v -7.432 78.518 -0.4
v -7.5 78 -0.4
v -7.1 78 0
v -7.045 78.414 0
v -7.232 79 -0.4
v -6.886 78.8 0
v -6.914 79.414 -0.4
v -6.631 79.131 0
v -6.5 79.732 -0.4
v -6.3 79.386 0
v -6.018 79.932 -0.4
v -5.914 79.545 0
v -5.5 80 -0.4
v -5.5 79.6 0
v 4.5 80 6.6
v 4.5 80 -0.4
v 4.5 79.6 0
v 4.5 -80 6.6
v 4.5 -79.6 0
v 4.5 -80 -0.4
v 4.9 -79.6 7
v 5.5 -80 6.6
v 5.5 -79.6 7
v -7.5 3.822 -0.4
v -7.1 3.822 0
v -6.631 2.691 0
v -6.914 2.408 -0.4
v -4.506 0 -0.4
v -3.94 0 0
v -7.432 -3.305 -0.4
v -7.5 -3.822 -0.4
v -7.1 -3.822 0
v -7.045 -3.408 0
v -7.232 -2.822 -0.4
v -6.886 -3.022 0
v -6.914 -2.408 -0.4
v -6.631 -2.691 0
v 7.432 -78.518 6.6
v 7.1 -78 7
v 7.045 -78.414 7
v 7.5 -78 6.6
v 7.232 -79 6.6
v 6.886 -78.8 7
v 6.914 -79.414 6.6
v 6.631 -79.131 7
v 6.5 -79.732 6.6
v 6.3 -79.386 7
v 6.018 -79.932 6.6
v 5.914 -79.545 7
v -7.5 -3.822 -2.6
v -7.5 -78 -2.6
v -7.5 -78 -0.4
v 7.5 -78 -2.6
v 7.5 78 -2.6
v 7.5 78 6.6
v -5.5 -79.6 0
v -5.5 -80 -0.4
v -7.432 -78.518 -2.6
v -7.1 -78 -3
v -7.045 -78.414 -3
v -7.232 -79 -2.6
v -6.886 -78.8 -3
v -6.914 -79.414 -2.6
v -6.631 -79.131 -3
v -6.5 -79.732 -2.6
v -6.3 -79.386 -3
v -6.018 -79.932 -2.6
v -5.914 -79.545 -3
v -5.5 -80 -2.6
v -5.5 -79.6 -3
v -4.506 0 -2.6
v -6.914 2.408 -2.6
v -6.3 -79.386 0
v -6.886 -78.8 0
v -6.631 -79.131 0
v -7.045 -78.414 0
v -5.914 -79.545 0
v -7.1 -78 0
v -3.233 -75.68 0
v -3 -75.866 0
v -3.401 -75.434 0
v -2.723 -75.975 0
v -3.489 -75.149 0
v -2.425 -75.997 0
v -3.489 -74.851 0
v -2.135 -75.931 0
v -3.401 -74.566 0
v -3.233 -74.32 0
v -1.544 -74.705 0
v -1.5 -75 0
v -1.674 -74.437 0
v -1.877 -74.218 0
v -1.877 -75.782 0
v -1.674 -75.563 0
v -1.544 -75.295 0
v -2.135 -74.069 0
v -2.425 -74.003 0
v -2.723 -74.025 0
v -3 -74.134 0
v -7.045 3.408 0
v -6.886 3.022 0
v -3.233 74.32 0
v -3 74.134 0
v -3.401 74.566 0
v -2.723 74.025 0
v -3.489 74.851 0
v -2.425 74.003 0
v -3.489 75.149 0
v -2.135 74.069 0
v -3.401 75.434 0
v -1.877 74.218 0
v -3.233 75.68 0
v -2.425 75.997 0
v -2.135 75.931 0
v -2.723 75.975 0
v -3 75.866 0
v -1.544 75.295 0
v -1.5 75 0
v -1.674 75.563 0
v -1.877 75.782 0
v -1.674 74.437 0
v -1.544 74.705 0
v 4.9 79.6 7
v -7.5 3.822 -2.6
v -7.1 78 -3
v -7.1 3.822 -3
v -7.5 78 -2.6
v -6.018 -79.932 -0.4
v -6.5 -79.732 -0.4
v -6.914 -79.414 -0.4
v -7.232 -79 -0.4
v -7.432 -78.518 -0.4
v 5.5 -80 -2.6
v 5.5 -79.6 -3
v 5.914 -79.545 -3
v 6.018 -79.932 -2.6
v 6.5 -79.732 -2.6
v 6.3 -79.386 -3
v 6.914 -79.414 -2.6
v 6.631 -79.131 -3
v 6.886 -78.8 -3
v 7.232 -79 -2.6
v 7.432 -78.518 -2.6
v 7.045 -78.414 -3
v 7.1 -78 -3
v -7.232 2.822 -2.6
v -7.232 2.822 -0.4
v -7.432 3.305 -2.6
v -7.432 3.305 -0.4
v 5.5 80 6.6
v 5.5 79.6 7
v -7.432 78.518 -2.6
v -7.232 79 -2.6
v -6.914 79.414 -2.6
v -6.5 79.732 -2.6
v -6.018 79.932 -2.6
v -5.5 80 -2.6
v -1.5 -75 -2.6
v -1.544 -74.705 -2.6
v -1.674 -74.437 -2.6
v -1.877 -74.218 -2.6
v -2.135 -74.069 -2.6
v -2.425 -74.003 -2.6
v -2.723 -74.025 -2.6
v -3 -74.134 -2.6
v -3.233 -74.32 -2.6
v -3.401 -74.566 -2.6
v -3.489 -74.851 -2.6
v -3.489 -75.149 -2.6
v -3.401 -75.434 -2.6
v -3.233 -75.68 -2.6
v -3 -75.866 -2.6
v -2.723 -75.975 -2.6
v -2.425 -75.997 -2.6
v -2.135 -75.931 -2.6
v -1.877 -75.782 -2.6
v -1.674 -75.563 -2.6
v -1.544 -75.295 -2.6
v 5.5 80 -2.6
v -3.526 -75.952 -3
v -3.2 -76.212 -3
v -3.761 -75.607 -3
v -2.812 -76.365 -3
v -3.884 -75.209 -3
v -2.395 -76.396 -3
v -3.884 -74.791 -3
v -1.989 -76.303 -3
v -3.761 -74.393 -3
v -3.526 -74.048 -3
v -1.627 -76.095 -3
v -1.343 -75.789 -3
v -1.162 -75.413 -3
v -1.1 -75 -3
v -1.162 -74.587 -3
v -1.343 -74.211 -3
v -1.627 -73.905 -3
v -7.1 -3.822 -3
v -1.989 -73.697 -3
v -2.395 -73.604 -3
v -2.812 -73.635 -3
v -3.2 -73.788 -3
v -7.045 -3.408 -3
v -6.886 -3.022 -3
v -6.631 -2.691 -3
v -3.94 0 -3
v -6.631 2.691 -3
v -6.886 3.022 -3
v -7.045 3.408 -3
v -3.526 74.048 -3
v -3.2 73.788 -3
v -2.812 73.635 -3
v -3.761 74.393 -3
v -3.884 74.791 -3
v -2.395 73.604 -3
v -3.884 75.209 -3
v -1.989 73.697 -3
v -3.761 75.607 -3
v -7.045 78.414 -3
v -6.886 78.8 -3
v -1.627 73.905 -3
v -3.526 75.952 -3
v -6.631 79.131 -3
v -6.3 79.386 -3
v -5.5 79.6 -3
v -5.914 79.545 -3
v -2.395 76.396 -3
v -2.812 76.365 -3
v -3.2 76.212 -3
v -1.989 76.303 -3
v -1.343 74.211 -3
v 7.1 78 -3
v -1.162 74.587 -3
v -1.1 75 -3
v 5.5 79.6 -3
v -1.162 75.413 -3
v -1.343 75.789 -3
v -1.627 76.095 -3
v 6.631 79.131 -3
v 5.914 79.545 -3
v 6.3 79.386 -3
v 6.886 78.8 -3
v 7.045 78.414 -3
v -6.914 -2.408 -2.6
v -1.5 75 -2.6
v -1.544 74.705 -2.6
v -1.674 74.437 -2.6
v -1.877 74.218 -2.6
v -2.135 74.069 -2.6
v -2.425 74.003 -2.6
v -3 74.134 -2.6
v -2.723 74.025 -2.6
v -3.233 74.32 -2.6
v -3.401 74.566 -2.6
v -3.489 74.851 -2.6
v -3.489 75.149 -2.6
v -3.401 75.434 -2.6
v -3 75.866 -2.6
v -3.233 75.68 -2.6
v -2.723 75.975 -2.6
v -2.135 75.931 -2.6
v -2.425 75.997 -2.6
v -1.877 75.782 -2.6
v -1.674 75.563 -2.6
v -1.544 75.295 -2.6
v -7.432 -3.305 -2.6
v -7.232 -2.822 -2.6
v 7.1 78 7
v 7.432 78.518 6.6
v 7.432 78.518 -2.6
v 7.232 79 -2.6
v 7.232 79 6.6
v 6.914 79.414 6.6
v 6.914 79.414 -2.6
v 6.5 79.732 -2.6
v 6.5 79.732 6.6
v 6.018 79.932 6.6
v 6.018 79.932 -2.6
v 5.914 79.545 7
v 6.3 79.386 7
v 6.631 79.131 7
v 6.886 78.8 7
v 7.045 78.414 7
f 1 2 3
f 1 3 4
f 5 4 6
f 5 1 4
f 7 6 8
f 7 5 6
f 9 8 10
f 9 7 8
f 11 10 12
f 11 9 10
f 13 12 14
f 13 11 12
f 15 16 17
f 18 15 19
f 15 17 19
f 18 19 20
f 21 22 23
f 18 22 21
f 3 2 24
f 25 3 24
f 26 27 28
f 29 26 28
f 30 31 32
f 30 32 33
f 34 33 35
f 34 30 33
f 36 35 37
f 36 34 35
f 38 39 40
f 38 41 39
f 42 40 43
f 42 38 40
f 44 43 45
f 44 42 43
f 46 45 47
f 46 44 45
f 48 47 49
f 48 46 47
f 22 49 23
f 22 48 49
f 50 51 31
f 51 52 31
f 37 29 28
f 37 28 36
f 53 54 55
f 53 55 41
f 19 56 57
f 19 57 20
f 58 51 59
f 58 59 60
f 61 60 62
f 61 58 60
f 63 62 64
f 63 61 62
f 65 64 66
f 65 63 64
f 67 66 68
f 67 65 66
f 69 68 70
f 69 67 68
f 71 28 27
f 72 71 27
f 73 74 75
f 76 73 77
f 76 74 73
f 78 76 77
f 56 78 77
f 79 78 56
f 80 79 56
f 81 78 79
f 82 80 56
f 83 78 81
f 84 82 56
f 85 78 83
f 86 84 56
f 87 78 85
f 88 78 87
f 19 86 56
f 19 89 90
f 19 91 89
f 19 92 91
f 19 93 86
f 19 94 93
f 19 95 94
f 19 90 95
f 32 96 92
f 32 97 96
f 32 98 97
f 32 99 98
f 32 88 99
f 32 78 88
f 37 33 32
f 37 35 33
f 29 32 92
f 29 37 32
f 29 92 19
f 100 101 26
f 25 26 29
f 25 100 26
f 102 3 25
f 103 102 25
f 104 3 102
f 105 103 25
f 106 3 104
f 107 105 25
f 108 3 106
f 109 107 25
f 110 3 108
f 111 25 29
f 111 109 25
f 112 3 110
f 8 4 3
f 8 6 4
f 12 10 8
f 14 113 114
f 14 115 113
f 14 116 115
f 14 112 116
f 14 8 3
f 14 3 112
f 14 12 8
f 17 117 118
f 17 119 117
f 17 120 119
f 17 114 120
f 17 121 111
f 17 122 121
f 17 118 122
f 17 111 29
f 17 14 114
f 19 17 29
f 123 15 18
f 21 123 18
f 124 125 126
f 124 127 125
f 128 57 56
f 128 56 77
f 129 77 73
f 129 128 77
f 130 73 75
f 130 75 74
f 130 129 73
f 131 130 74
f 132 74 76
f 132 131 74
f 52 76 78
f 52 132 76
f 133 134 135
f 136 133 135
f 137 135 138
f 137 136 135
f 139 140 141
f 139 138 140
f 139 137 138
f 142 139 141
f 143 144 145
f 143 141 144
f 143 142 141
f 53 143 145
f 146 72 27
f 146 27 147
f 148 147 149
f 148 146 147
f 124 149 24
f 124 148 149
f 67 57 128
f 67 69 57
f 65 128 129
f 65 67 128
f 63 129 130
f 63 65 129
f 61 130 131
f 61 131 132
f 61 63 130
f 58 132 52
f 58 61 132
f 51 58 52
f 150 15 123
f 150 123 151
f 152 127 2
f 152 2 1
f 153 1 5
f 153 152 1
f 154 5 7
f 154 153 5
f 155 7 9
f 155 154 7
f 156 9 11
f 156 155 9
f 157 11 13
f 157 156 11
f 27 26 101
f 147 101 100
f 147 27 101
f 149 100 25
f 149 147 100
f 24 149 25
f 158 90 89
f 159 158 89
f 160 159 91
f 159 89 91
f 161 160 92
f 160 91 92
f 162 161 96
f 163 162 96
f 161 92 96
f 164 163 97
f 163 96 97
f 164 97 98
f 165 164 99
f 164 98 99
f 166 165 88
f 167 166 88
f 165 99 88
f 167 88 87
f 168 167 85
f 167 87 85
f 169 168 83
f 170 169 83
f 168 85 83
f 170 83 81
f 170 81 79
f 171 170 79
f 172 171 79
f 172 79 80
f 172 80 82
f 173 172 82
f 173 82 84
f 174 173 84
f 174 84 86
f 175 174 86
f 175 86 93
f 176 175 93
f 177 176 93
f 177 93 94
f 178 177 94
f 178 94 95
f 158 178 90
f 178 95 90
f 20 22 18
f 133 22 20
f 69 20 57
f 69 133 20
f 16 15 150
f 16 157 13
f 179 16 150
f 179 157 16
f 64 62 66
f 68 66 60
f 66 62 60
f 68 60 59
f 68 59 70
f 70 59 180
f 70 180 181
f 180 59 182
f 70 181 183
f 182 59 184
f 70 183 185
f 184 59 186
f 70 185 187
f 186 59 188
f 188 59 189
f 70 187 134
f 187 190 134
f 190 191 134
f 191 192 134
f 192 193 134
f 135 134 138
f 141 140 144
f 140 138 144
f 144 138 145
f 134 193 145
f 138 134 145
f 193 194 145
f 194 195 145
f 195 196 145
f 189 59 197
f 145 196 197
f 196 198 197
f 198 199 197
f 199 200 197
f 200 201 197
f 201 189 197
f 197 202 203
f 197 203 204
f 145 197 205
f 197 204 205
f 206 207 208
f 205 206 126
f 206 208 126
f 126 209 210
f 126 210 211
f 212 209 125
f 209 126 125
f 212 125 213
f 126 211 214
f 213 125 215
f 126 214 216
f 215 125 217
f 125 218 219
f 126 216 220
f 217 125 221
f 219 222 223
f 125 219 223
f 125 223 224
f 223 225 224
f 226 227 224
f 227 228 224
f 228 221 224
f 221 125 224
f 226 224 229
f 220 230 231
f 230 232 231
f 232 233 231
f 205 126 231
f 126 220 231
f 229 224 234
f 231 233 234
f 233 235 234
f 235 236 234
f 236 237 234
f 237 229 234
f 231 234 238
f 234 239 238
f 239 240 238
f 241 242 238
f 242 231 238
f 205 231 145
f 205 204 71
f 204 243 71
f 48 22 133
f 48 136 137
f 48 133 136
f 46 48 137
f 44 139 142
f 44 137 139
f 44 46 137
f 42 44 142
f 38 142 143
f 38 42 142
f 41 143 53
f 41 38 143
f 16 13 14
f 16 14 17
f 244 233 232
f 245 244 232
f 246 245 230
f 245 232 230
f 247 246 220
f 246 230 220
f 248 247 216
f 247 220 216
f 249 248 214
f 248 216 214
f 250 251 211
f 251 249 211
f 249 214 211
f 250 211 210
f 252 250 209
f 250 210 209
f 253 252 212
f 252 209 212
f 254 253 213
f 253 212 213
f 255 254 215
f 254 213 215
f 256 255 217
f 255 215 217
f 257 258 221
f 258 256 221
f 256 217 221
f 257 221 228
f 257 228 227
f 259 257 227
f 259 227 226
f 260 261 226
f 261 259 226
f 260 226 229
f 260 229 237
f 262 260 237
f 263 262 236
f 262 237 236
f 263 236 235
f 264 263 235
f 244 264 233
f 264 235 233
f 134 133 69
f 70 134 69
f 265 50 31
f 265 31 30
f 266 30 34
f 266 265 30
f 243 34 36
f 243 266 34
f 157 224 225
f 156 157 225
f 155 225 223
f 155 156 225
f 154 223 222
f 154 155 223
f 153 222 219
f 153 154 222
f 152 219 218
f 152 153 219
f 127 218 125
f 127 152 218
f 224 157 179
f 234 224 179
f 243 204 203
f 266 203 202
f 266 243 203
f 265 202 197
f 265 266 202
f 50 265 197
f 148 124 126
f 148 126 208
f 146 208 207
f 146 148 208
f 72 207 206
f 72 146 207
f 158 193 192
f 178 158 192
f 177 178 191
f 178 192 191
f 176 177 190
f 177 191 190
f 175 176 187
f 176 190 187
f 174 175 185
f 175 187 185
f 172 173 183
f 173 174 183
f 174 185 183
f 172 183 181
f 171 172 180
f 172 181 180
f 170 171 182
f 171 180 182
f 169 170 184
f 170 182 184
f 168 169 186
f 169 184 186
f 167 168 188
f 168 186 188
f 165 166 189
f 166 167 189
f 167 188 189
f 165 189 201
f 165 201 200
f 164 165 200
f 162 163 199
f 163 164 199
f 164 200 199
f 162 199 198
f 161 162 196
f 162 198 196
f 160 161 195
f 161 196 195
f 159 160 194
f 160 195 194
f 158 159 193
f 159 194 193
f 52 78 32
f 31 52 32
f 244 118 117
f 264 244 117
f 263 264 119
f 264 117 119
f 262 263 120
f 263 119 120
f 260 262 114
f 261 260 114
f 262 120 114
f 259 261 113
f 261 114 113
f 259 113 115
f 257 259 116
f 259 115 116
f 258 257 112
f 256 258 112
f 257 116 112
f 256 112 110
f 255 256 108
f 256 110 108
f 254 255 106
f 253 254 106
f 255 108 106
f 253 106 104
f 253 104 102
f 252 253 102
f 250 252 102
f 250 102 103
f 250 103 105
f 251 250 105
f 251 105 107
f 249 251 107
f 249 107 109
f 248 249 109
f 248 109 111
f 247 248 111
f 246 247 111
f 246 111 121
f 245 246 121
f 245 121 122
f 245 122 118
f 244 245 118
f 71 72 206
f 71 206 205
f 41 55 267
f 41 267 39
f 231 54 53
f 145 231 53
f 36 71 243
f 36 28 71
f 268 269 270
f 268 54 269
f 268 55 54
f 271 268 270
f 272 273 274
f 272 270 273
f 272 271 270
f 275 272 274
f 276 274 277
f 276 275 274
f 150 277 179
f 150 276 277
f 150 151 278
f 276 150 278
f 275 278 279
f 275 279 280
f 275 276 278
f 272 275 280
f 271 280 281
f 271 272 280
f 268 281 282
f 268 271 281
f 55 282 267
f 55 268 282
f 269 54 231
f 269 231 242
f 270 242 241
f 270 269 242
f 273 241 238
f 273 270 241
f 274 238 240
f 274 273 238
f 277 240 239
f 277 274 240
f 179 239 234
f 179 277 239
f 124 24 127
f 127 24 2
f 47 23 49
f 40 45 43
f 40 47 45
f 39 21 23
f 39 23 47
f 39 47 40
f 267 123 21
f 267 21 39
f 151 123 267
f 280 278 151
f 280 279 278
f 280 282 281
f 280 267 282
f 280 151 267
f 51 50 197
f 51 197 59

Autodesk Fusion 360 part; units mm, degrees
sketch "Sketch1" plane through (0, 0, 0) normal (0, 0, 1) x (1, 0, 0) in component "bed_hole_marking_template_x1_Rev2"
  line L0 (7.5, -80) -> (-7.5, -80)
  line L1 (-7.5, -80) -> (-7.5, 80)
  line L2 (-7.5, 80) -> (7.5, 80)
  line L3 (7.5, 80) -> (7.5, -80)
  line L4 (7.5, -80) -> (-7.5, 80) construction
  line L5 (-7.5, -80) -> (7.5, 80) construction
  line L6 (-4.5, -0.0061) -> (-7.5, 2.9939)
  line L7 (0, 0) -> (-10, 0) construction
  circle A0 centre (-2.5, 75) radius 1
  line L8 (-4.5, 0.0061) -> (-7.5, -2.9939)
  line L9 (4.5, 80) -> (4.5, -80)
  circle A1 centre (-2.5, -75) radius 1
  point P0 (-2.5, -75)
  dimension "d1" = 15
  dimension "d2" = 160
  dimension "d3" = 135
  dimension "d4" = 2
  dimension "d5" = 5
  dimension "d6" = 5
  dimension "d7" = 4.5
  dimension "d8" = 3
extrude "Extrude1" add sketch "Sketch1" against normal blind 3 contours L0 L2 L3 L9 | L0 L1 L2 L6 L8 L9 in component "bed_hole_marking_template_x1_Rev2"
extrude "Extrude2" add sketch "Sketch1" along normal blind 7 contours L0 L2 L3 L9 in component "bed_hole_marking_template_x1_Rev2"
fillet "Fillet1" radius 2 6 edges at (-7.5, 80, -1.5) (7.5, 80, 2) (-7.5, -80, -1.5) (7.5, -80, 2) (-7.5, 2.9939, -1.5) (-7.5, -2.9939, -1.5) in component "bed_hole_marking_template_x1_Rev2"
chamfer "Chamfer1" distance 0.4 angle 45 31 edges at (7.5, 0, 7) (6.9142, -79.4142, 7) (5, -80, 7) (5, 80, 7) (6.9142, 79.4142, 7) (4.5, 0, 7) (-0.5, -80, 0) (-6.9142, -79.4142, 0) (-7.5, -40.9112, 0) (-7.3478, -3.057, 0) (-5.7101, -1.2041, 0) (-7.5, 40.9112, 0) (-7.3478, 3.057, 0) (-5.7101, 1.2041, 0) (-0.5, 80, 0) (-6.9142, 79.4142, 0) (0, 80, -3) (-6.9142, 79.4142, -3) (-7.5, 40.9112, -3) (-7.3478, 3.057, -3) (-5.7101, 1.2041, -3) (-5.7101, -1.2041, -3) (-7.3478, -3.057, -3) (-7.5, -40.9112, -3) (-6.9142, -79.4142, -3) (0, -80, -3) (6.9142, -79.4142, -3) (7.5, 0, -3) (6.9142, 79.4142, -3) (-3.4323, 74.6384, -3) (-3.4323, -75.3616, -3) in component "bed_hole_marking_template_x1_Rev2"
component "bed_hole_marking_template_x1_Rev2" placed x (1, 0, 0) y (0, 1, 0) z (0, 0, 1) at (0, 0, 0)
